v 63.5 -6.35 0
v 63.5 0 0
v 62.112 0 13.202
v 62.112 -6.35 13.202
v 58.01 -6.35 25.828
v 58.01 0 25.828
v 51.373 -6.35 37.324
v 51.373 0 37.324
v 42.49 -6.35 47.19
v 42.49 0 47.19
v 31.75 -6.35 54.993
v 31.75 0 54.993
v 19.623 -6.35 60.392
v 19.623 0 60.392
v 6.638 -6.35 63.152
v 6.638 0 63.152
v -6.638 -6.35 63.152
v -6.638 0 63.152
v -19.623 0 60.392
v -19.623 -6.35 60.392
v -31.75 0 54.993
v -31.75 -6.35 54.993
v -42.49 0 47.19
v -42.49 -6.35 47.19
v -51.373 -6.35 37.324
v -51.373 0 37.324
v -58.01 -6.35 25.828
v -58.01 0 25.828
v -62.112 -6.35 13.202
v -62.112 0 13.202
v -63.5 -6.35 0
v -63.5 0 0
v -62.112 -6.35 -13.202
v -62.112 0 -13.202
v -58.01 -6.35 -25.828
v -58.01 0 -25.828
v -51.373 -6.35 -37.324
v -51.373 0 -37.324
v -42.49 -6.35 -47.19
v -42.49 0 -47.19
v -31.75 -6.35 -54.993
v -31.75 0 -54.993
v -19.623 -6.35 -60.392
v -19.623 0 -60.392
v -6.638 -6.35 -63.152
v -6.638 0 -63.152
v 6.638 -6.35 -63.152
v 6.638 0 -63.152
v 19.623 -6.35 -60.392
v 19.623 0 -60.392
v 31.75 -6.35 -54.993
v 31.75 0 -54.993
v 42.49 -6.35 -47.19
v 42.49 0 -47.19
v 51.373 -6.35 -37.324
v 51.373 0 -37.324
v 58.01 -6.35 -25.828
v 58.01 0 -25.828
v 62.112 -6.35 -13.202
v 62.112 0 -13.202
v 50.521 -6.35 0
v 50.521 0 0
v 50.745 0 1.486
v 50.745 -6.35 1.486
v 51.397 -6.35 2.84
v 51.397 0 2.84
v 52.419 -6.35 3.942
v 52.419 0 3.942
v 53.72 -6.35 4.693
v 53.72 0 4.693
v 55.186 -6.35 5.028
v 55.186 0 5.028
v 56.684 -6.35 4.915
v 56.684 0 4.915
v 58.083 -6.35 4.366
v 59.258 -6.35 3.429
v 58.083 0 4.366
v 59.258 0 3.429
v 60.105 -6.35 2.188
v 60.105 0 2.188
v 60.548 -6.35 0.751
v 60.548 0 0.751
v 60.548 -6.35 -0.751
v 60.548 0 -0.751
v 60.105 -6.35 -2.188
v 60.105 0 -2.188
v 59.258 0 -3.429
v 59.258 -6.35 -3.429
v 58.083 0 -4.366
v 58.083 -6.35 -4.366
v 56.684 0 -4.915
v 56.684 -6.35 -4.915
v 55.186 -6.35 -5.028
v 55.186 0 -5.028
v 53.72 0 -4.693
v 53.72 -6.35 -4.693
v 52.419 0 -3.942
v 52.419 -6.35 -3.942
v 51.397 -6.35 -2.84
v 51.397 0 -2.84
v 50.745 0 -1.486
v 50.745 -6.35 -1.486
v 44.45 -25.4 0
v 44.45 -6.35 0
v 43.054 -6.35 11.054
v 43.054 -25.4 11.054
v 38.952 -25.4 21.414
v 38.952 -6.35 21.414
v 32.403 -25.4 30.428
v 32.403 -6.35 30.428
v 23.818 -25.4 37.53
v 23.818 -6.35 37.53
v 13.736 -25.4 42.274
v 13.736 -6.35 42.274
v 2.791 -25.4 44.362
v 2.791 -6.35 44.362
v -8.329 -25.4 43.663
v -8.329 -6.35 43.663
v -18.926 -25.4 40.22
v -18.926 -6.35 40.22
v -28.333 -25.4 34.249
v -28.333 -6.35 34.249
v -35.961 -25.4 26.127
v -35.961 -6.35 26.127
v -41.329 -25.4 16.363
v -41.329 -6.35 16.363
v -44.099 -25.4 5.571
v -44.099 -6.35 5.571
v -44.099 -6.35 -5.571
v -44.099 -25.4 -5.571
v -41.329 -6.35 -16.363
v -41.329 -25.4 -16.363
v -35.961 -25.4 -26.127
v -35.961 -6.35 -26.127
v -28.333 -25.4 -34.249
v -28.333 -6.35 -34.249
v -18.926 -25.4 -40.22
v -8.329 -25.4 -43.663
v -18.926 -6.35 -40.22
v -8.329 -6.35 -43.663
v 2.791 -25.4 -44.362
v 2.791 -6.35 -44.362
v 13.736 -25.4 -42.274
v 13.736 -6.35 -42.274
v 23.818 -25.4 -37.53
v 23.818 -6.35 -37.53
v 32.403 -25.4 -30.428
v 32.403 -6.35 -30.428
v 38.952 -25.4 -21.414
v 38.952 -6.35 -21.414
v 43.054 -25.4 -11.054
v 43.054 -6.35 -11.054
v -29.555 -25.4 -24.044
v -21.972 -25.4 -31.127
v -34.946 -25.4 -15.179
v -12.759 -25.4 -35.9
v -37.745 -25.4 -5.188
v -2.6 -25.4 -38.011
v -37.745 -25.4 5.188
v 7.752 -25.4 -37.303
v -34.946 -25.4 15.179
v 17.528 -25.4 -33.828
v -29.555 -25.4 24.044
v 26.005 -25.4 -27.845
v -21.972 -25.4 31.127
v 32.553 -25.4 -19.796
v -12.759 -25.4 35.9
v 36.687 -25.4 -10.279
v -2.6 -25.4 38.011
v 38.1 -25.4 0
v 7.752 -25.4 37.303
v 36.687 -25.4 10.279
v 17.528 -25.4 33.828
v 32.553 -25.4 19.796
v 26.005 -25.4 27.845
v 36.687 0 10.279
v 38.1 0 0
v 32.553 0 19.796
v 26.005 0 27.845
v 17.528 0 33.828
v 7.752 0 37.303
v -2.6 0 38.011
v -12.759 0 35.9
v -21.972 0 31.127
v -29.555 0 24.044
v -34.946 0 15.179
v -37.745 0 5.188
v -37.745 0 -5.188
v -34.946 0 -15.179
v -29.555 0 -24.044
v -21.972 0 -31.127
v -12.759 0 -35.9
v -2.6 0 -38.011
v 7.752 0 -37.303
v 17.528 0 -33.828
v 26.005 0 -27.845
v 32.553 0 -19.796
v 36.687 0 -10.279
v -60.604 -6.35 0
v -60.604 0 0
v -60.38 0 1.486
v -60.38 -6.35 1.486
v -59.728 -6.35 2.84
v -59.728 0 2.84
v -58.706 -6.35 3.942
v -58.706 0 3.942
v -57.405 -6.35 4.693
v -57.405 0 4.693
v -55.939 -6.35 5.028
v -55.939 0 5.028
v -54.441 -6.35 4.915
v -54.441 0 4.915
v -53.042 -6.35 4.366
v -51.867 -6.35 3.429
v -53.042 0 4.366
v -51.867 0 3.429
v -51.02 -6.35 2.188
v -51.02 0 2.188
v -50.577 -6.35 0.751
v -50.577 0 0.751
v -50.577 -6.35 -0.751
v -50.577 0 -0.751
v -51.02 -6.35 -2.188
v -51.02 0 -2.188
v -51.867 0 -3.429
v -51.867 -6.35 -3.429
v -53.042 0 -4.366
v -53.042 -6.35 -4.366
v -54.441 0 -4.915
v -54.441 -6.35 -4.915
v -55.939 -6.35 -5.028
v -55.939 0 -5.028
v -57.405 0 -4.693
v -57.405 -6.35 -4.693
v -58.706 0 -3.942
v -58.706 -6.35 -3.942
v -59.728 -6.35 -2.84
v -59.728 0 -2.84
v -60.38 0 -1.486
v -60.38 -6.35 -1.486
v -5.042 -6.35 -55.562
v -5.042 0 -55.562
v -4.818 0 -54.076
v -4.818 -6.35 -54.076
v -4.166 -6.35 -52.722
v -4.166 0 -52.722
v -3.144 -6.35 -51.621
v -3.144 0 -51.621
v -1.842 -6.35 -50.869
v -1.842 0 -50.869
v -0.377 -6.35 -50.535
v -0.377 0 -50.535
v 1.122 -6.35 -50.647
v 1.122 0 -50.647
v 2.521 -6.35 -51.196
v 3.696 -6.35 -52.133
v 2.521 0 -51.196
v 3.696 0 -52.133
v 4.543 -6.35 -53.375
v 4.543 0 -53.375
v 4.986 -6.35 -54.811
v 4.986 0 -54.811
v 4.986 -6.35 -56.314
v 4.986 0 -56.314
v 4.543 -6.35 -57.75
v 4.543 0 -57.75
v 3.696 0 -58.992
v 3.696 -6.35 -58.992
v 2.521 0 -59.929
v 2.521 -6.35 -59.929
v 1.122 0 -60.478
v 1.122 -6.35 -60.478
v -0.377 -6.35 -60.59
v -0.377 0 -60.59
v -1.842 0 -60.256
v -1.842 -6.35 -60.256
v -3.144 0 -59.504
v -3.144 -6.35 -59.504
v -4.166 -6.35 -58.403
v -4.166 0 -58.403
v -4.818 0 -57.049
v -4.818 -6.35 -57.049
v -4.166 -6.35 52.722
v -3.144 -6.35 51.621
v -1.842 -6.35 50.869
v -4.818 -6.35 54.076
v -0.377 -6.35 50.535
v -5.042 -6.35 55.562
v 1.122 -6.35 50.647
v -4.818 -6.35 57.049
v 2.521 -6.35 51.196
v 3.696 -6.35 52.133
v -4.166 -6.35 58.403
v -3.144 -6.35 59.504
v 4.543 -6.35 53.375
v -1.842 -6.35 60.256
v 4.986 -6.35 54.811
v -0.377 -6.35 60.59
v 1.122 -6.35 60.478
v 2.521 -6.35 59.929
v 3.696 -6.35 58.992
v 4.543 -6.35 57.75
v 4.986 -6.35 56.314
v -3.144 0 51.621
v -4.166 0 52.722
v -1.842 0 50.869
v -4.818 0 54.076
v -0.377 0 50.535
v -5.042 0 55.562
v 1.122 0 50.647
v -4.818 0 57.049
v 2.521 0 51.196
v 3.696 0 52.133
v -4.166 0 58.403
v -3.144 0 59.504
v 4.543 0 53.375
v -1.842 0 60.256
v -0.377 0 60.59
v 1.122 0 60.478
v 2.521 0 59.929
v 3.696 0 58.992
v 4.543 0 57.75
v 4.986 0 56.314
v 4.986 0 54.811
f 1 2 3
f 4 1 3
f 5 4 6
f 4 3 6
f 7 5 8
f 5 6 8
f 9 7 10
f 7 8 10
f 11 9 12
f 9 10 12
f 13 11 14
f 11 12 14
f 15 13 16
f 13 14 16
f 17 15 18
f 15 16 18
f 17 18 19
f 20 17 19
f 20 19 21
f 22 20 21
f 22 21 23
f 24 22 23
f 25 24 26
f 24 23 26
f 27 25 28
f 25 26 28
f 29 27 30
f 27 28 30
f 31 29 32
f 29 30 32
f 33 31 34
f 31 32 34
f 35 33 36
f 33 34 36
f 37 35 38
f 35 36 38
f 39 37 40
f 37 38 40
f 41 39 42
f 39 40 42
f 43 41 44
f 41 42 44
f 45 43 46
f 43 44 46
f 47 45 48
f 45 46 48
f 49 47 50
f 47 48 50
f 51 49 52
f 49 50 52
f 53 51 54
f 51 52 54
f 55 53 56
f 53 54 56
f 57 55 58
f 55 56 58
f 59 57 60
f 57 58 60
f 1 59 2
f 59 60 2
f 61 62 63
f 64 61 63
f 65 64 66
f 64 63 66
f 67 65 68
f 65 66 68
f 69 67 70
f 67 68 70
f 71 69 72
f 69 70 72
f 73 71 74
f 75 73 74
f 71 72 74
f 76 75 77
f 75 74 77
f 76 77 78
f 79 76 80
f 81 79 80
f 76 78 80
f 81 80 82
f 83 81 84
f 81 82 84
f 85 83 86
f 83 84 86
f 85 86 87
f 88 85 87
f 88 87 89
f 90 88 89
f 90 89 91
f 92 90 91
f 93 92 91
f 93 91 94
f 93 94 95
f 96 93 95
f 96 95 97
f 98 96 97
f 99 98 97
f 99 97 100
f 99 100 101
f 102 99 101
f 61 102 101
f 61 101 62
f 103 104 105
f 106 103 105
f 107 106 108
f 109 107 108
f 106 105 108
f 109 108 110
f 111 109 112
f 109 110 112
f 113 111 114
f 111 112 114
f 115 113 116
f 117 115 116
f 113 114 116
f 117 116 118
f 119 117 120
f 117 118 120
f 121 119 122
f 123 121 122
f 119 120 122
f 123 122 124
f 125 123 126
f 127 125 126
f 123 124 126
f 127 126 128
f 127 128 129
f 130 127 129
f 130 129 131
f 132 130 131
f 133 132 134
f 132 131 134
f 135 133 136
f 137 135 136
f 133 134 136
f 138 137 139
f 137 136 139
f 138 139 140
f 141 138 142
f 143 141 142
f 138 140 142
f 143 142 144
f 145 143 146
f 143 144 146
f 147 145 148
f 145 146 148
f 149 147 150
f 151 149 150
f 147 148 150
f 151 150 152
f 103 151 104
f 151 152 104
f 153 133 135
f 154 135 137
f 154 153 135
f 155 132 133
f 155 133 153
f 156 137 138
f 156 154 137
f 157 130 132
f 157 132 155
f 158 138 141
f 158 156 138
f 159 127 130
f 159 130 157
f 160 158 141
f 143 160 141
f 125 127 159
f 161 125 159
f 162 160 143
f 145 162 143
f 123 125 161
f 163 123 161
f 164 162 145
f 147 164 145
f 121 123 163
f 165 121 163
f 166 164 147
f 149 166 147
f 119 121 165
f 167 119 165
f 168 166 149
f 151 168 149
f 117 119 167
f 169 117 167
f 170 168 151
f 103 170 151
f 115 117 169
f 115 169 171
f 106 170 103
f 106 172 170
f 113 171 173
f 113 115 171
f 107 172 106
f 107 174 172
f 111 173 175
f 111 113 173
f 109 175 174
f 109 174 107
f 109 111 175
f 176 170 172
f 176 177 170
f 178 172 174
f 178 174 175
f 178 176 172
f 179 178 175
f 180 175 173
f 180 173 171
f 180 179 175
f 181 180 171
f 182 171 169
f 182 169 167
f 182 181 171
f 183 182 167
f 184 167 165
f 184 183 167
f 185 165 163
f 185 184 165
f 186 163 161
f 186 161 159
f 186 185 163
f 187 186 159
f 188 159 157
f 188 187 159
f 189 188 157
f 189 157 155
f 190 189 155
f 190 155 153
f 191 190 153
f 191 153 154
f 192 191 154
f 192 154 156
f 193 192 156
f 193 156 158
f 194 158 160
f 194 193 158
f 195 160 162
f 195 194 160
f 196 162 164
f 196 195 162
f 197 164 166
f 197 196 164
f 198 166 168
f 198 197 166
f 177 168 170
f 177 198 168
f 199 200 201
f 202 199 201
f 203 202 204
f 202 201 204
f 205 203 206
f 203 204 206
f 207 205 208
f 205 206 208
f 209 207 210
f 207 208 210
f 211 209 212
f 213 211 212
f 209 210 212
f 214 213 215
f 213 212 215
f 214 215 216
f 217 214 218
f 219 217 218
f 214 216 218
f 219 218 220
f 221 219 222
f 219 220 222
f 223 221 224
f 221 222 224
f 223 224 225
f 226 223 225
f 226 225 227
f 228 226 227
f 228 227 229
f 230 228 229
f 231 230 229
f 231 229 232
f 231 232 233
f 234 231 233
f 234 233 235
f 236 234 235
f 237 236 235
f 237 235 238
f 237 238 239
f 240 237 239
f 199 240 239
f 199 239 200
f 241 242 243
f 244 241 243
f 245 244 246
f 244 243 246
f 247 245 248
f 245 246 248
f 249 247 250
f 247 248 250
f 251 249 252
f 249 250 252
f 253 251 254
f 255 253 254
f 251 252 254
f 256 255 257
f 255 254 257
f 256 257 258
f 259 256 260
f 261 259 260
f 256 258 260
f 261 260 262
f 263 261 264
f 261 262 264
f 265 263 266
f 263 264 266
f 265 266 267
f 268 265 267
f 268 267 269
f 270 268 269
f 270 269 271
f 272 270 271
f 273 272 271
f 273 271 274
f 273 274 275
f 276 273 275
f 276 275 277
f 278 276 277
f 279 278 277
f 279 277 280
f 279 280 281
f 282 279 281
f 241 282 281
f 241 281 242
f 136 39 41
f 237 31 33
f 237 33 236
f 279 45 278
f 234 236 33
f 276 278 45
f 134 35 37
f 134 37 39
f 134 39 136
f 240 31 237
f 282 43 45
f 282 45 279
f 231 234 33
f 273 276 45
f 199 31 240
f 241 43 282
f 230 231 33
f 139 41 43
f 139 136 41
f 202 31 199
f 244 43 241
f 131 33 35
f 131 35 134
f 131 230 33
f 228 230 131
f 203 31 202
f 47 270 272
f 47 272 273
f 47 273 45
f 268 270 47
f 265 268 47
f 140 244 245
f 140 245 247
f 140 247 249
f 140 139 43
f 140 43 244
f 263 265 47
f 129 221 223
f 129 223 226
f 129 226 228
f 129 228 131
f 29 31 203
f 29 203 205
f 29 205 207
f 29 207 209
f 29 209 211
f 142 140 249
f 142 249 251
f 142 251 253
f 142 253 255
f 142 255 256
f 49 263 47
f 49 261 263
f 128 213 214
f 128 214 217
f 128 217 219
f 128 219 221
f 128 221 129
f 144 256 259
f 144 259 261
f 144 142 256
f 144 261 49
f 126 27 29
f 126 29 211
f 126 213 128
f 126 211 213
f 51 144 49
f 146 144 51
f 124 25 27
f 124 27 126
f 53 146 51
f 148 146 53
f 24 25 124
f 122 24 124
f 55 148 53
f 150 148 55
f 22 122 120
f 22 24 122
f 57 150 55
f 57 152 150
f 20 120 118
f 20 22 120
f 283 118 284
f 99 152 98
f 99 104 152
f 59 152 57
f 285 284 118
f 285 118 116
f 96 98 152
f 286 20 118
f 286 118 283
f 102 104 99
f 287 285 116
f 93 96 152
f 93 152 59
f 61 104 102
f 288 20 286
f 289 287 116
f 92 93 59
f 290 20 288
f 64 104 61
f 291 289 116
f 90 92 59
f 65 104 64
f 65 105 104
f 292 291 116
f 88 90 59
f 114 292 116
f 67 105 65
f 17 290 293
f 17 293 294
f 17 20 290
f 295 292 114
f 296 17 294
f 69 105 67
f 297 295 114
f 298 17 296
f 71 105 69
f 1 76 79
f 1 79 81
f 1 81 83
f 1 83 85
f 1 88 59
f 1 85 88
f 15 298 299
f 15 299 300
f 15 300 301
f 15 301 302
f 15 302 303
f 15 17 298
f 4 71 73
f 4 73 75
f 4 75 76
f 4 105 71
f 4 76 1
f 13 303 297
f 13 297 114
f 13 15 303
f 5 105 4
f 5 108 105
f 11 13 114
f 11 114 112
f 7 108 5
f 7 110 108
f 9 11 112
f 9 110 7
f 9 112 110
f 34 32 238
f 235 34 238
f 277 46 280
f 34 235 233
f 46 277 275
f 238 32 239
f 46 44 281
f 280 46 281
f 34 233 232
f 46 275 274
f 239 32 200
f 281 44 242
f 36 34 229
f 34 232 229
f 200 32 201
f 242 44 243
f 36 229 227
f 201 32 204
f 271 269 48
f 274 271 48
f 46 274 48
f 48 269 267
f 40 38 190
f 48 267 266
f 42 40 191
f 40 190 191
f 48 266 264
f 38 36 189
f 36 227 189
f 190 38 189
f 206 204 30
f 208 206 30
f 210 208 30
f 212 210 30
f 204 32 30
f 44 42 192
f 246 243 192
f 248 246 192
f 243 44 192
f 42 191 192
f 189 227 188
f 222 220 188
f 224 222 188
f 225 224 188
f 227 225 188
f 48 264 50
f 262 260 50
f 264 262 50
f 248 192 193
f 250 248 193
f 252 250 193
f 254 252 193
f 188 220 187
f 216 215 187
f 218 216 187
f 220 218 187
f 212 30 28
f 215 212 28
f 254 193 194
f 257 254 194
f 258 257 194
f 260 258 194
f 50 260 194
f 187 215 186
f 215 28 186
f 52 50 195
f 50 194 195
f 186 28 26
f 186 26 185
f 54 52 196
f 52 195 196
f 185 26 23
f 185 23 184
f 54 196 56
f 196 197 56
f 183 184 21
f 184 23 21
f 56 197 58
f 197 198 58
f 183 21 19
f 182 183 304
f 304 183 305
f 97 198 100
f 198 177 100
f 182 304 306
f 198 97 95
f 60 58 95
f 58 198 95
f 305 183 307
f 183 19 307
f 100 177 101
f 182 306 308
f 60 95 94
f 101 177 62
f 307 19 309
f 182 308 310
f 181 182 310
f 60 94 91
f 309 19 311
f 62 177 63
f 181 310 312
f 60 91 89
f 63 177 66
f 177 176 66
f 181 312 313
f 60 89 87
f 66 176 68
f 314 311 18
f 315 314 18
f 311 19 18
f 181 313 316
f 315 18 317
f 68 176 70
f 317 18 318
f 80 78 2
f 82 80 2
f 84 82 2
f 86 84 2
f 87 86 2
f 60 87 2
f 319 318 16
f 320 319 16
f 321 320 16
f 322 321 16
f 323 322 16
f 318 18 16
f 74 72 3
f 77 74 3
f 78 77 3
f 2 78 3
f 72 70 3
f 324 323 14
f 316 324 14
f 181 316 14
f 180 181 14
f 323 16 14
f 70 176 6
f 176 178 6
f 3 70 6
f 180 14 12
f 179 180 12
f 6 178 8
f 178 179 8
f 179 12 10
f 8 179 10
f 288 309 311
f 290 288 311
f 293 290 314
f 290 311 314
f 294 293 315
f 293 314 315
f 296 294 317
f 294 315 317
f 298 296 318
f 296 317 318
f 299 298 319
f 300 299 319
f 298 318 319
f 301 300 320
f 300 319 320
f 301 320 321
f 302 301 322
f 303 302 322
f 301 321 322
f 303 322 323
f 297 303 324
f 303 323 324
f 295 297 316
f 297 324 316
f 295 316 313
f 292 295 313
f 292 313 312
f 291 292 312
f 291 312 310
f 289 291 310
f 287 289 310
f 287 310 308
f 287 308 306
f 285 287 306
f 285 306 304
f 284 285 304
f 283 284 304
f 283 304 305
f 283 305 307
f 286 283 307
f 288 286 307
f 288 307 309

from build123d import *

# Parameters (mm, degrees)
F0_R     = 63.5
F0_R_2   = 38.1
F1_DEPTH = 6.35
F2_R     = 44.45
F2_R_2   = 38.1
F3_DEPTH = 19.05
F5_D     = 10.0838


with BuildPart() as f1:
    # F0 (on Front) → F1 (new body)
    with BuildSketch(Plane.XZ):
        Circle(F0_R)
        Circle(F0_R_2, mode=Mode.SUBTRACT)
    extrude(amount=F1_DEPTH)

    # F2 (on face) → F3 (join)
    with BuildSketch(Plane.XZ.offset(6.35)):
        Circle(F2_R)
        Circle(F2_R_2, mode=Mode.SUBTRACT)
    extrude(amount=F3_DEPTH)

    # F5 (through all)
    with Locations(Plane.XZ.offset(6.35)):
        with Locations((0, 55.5625), (55.5625, 0), (-55.5625, 0), (0, -55.5625)):
            Hole(F5_D / 2)


solid = f1.part
